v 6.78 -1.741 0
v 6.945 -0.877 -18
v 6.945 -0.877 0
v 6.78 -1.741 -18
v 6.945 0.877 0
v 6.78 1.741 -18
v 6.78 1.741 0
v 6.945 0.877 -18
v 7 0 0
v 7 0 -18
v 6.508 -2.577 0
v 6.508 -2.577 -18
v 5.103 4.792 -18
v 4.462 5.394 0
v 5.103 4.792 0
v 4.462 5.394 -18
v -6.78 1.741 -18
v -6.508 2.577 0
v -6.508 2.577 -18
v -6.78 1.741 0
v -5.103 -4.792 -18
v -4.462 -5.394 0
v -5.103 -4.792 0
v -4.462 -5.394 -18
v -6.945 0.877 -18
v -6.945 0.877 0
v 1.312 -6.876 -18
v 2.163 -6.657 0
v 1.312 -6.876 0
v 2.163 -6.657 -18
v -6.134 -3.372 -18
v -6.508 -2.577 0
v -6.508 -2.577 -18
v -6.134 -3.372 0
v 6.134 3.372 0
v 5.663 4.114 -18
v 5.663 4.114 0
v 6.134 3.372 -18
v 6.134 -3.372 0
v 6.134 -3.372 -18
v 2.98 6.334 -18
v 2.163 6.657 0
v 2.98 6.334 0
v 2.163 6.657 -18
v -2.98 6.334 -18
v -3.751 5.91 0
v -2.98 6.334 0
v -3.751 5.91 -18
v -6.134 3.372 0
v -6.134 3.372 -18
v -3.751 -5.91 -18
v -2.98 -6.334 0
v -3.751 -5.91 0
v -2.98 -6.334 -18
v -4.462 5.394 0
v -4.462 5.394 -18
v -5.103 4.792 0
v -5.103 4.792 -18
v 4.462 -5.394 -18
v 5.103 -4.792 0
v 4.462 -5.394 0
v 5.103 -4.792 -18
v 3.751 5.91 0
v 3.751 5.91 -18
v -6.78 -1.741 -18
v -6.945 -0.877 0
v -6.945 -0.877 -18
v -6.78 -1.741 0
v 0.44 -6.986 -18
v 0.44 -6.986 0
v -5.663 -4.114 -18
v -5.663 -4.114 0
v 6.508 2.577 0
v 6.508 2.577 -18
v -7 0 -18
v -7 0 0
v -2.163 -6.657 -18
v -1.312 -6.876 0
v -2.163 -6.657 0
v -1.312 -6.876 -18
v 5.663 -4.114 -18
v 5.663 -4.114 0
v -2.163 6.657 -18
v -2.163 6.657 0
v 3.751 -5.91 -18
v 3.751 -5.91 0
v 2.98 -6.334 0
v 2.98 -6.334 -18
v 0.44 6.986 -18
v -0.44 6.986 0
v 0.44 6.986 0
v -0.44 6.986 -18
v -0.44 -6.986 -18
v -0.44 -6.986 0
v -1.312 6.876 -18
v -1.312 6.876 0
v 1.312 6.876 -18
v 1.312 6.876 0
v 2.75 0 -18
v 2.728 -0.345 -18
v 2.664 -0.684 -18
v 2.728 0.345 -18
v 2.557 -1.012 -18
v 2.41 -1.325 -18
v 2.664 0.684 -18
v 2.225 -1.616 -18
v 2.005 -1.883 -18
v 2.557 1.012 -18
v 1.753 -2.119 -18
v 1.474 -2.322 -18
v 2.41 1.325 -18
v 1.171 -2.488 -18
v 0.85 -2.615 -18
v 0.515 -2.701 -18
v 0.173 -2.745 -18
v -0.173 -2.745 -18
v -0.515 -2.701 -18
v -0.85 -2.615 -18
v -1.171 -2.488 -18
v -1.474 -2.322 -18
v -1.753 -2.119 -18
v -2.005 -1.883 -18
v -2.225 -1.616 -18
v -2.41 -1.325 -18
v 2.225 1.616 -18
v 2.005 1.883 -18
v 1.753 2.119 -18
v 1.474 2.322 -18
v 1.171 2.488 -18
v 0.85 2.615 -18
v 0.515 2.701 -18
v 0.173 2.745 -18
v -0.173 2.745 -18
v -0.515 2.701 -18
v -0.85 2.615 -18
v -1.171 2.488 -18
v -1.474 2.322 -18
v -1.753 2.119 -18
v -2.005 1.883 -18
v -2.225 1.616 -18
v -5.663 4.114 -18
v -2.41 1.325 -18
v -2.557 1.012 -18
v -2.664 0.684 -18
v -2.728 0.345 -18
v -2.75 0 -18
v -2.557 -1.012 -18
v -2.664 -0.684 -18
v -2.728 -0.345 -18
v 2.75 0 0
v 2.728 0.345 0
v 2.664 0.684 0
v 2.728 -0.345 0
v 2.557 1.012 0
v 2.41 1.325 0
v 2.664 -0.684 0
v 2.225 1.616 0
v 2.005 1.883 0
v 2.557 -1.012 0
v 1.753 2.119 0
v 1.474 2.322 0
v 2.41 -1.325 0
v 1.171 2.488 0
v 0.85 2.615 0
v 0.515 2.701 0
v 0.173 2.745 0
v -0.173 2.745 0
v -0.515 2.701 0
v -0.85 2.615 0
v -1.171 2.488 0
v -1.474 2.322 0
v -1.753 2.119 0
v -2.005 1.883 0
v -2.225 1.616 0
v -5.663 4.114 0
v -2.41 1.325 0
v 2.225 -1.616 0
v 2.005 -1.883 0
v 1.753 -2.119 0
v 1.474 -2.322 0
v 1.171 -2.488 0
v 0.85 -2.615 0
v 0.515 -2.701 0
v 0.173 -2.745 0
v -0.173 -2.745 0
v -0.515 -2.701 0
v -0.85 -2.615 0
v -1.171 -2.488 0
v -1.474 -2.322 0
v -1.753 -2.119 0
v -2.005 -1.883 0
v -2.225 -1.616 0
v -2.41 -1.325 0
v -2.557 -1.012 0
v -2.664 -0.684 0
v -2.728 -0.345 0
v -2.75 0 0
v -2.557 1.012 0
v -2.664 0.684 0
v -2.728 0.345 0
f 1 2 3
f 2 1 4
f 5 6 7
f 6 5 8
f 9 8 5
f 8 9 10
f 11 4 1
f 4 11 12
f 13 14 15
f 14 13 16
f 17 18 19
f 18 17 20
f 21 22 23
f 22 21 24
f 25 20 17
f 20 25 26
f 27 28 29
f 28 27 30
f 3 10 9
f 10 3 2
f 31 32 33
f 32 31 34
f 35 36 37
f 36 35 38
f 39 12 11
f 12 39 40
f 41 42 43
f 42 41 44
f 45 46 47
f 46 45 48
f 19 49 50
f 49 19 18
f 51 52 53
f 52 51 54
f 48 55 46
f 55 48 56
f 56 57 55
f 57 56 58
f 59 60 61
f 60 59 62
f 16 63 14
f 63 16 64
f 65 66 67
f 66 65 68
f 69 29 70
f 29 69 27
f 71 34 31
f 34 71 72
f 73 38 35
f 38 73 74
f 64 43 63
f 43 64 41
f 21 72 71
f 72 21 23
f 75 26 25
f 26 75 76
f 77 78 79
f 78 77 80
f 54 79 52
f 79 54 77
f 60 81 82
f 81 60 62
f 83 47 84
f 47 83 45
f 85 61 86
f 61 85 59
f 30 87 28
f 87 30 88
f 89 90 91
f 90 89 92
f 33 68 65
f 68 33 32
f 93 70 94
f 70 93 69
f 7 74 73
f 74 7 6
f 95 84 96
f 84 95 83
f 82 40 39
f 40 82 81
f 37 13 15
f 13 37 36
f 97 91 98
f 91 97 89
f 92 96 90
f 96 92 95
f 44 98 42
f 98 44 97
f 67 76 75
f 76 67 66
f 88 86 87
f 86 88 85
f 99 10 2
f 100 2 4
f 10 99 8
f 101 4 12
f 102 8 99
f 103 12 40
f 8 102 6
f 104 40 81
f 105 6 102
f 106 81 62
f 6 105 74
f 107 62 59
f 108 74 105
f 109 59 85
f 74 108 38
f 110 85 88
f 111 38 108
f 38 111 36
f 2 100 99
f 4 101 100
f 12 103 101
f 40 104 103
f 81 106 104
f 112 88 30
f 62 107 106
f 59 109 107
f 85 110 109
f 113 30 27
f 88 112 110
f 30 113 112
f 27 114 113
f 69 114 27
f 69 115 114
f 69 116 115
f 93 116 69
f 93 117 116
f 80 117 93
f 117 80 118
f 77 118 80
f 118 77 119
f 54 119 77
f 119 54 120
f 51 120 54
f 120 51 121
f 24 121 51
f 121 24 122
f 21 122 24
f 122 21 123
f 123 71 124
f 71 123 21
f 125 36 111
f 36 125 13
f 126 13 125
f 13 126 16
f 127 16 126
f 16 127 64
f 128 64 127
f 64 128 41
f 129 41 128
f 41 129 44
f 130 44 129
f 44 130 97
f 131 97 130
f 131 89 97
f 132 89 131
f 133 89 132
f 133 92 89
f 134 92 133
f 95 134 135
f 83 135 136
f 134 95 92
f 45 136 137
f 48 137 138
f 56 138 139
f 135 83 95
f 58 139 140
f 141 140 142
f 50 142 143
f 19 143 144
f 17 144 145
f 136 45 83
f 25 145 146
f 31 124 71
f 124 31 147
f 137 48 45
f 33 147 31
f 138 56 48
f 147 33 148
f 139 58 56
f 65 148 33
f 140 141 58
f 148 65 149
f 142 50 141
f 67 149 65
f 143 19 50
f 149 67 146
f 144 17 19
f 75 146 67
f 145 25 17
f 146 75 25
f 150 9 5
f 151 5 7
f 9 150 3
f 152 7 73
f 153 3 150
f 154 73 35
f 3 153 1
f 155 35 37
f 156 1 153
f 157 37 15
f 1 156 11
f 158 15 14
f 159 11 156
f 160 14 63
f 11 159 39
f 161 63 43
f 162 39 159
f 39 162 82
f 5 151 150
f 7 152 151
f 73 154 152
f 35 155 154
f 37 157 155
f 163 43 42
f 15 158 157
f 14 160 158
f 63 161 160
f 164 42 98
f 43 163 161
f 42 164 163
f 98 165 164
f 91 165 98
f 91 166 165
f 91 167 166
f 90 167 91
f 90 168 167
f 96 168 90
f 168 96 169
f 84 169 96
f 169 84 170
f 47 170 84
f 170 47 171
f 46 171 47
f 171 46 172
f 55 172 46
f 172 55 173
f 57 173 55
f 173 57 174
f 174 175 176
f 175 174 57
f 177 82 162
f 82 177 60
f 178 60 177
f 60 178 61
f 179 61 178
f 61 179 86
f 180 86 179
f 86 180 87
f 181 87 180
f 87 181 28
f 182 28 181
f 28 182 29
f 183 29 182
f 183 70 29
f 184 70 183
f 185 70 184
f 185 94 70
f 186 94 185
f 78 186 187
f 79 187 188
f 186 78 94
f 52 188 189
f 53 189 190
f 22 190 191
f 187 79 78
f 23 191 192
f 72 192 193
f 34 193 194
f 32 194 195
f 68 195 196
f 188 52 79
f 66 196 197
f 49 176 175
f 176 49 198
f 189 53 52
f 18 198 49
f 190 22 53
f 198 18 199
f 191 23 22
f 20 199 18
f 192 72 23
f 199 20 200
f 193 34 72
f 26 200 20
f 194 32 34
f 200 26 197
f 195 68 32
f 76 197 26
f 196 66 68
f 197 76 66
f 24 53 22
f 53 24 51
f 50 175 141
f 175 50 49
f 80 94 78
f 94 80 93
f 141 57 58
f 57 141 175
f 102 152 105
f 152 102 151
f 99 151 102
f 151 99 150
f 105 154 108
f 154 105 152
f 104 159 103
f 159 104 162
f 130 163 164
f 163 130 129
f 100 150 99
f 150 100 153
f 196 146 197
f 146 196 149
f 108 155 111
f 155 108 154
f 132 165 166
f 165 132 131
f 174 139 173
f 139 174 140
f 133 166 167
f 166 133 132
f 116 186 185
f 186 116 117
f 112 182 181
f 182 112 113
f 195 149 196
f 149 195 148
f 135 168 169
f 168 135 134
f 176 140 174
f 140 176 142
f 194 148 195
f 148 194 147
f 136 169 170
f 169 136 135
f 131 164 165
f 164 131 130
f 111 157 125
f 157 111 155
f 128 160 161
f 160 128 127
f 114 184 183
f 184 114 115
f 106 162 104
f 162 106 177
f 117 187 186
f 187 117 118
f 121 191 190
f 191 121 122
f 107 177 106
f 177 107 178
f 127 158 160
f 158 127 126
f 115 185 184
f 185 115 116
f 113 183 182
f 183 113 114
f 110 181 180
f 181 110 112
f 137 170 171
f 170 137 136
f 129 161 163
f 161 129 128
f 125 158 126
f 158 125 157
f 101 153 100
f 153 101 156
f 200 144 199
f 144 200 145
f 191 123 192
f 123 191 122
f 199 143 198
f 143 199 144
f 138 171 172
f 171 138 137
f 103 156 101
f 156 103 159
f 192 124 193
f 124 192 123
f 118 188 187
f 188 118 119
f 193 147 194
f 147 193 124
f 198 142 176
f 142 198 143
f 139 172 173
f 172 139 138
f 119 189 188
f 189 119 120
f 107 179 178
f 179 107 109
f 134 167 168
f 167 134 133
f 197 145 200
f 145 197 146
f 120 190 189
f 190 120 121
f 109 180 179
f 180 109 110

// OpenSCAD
$fn = 50;


difference() {
	union() {
		translate(v = [0, 0, -18.0000000000]) {
			cylinder(h = 18, r = 7.0000000000);
		}
		cylinder(h = 0, r = 13.0000000000);
	}
	union() {
		#translate(v = [0, 0, -18]) {
			cylinder(h = 18, r = 2.7500000000);
		}
	}
}
